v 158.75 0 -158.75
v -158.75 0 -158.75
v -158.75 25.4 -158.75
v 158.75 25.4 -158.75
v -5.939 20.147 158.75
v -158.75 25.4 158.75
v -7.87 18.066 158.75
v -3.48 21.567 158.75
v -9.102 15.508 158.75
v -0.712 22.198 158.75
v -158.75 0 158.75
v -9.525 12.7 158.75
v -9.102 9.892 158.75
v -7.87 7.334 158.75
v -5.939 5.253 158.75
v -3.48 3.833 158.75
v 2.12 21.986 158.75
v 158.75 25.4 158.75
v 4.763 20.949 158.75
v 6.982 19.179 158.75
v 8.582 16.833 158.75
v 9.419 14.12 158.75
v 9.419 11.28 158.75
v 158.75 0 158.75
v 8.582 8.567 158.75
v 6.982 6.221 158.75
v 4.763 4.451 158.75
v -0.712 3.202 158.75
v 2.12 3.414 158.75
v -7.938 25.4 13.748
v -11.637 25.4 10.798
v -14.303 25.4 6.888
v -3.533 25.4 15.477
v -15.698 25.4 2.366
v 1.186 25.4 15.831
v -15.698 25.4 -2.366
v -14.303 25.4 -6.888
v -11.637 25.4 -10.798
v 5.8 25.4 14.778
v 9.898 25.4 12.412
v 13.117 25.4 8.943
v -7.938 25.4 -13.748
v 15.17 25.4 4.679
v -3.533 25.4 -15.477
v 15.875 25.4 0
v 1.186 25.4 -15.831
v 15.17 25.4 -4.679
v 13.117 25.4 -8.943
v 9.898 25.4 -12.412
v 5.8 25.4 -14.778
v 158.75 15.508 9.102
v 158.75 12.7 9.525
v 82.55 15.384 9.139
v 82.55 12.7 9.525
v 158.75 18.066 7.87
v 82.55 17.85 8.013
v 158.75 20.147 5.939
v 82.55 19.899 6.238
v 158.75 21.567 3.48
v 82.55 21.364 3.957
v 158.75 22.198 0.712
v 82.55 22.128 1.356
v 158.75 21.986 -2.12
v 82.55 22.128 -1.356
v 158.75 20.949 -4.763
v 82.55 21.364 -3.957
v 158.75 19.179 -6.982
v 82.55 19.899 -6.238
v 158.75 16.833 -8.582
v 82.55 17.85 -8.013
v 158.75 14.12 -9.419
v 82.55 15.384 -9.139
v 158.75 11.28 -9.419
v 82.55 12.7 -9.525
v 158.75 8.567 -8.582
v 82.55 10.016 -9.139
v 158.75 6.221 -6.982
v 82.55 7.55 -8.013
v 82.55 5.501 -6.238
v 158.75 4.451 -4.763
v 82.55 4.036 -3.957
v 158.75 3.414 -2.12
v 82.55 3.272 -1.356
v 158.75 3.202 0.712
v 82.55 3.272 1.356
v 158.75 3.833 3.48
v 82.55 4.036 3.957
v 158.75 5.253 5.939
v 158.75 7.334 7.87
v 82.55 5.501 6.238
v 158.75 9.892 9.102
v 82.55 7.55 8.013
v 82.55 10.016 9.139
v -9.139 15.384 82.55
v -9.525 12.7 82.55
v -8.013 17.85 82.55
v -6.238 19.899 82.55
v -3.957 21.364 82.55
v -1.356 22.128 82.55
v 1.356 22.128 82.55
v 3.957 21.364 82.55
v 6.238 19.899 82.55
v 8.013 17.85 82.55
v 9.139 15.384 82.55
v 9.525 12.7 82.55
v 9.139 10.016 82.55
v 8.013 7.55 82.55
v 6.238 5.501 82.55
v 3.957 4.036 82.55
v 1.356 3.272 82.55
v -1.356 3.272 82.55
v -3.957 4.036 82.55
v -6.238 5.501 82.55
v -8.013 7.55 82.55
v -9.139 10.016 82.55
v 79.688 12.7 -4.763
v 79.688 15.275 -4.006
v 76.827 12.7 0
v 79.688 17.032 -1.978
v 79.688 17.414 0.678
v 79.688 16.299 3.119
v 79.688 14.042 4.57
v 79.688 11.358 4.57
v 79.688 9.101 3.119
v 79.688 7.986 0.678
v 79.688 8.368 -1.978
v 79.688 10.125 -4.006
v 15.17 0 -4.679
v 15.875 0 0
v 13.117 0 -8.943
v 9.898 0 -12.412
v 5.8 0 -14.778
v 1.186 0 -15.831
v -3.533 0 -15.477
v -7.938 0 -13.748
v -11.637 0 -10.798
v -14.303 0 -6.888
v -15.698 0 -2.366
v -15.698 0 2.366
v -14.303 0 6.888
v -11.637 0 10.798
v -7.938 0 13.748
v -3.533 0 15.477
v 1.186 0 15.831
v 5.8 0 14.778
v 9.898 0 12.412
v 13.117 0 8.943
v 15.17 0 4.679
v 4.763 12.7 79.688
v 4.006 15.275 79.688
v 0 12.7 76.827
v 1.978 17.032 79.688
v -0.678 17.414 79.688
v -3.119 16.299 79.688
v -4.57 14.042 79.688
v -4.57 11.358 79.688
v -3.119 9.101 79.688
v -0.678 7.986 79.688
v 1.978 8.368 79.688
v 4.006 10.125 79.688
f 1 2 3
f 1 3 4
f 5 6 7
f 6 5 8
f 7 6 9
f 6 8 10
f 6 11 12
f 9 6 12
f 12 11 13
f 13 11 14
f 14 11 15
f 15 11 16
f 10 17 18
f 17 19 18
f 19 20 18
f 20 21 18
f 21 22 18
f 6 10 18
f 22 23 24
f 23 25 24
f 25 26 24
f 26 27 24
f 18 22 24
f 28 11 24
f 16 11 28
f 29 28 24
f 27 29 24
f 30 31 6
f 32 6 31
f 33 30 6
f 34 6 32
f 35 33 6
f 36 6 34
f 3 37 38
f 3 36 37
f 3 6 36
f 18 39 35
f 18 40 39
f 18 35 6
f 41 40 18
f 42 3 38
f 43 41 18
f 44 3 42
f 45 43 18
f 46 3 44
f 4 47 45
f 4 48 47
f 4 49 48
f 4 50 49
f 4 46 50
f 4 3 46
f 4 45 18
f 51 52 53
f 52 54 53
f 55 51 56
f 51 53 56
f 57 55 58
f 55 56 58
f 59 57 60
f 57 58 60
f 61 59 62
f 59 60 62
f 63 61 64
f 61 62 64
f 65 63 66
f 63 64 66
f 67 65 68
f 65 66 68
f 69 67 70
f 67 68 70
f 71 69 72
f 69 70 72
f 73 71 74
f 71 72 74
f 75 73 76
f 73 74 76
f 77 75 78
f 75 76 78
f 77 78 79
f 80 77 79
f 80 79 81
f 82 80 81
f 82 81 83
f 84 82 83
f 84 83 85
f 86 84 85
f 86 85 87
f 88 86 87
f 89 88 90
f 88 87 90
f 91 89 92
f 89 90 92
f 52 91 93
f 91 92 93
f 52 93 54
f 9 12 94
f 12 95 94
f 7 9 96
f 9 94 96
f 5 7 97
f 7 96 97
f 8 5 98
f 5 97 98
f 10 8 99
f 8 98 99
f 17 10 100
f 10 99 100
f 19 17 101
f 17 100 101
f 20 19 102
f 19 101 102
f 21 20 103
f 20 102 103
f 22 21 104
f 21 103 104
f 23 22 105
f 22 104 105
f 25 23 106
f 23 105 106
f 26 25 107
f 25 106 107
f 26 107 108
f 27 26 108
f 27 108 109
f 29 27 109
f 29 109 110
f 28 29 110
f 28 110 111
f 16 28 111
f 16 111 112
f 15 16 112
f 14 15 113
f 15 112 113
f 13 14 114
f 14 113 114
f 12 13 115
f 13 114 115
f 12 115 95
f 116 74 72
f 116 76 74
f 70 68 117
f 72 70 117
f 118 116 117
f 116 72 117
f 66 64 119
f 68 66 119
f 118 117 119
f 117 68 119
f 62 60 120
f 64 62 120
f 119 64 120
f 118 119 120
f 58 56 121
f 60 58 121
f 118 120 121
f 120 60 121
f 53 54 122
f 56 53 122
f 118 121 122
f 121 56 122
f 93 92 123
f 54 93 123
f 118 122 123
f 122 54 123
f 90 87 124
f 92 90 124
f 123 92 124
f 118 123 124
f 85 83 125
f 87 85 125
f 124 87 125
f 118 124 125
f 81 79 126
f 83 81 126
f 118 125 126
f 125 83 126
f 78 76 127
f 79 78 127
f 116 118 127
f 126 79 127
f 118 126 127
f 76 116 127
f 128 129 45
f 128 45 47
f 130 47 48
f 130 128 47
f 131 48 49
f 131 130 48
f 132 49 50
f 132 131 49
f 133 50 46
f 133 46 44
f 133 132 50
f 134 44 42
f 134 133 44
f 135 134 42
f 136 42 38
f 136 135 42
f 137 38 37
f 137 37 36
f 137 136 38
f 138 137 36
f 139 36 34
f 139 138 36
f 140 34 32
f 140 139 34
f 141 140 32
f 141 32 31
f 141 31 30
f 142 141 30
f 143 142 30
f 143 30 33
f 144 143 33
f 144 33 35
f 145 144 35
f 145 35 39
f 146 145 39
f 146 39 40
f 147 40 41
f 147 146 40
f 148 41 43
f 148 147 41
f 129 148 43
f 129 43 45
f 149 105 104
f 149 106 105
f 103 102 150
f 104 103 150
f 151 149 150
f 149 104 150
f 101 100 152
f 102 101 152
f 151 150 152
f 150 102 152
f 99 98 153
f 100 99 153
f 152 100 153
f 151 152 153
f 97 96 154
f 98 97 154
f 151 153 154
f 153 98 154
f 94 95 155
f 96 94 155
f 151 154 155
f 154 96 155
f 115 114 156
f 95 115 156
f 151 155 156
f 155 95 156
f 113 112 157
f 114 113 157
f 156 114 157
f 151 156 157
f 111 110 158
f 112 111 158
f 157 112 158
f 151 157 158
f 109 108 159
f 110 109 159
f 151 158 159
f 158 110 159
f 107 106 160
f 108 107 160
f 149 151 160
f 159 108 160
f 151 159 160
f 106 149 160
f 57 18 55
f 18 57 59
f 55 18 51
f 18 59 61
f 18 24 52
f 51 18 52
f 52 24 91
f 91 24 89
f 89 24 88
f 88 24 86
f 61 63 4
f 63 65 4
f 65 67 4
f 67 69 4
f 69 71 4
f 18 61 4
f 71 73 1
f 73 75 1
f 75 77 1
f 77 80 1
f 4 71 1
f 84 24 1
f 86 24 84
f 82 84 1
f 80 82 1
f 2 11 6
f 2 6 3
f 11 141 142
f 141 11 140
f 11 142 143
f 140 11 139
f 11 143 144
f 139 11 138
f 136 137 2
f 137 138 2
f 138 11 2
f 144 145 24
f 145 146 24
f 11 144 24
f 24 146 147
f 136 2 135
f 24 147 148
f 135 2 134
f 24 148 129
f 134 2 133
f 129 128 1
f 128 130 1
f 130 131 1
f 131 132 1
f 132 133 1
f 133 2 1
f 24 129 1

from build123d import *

# Parameters (mm, degrees)
SKETCH1_W                       = 317.5
SKETCH1_H                       = 317.5
SKETCH1_R                       = 15.875
BOSS_EXTRUDE1_DEPTH             = 25.4
F_3_4_0_75_DIAMETER_HOLE2_D     = 19.05
F_3_4_0_75_DIAMETER_HOLE2_DEPTH = 76.2
F_3_4_0_75_DIAMETER_HOLE2_TIP   = 5.723197396
F_3_4_0_75_DIAMETER_HOLE1_D     = 19.05
F_3_4_0_75_DIAMETER_HOLE1_DEPTH = 76.2
F_3_4_0_75_DIAMETER_HOLE1_TIP   = 5.723197396


with BuildPart() as part:
    # Sketch1 → Boss-Extrude1 (new body)
    with BuildSketch(Plane(origin=(0, 0, 0), x_dir=(1, 0, 0), z_dir=(0, 1, 0))):
        Rectangle(SKETCH1_W, SKETCH1_H)
        Circle(SKETCH1_R, mode=Mode.SUBTRACT)
    extrude(amount=BOSS_EXTRUDE1_DEPTH)

    # 3/4 (0.75) Diameter Hole2
    with Locations(Plane(origin=(158.75, 0, 0), x_dir=(0, 0, -1), z_dir=(1, 0, 0))):
        with Locations((0, 12.7)):
            Hole(F_3_4_0_75_DIAMETER_HOLE2_D / 2, depth=F_3_4_0_75_DIAMETER_HOLE2_DEPTH)
            with Locations((0, 0, -(F_3_4_0_75_DIAMETER_HOLE2_DEPTH + F_3_4_0_75_DIAMETER_HOLE2_TIP / 2))):  # 118° drill point
                Cone(0, F_3_4_0_75_DIAMETER_HOLE2_D / 2, F_3_4_0_75_DIAMETER_HOLE2_TIP, mode=Mode.SUBTRACT)

    # 3/4 (0.75) Diameter Hole1
    with Locations(Plane.XY.offset(158.75)):
        with Locations((0, 12.7)):
            Hole(F_3_4_0_75_DIAMETER_HOLE1_D / 2, depth=F_3_4_0_75_DIAMETER_HOLE1_DEPTH)
            with Locations((0, 0, -(F_3_4_0_75_DIAMETER_HOLE1_DEPTH + F_3_4_0_75_DIAMETER_HOLE1_TIP / 2))):  # 118° drill point
                Cone(0, F_3_4_0_75_DIAMETER_HOLE1_D / 2, F_3_4_0_75_DIAMETER_HOLE1_TIP, mode=Mode.SUBTRACT)


solid = part.part
